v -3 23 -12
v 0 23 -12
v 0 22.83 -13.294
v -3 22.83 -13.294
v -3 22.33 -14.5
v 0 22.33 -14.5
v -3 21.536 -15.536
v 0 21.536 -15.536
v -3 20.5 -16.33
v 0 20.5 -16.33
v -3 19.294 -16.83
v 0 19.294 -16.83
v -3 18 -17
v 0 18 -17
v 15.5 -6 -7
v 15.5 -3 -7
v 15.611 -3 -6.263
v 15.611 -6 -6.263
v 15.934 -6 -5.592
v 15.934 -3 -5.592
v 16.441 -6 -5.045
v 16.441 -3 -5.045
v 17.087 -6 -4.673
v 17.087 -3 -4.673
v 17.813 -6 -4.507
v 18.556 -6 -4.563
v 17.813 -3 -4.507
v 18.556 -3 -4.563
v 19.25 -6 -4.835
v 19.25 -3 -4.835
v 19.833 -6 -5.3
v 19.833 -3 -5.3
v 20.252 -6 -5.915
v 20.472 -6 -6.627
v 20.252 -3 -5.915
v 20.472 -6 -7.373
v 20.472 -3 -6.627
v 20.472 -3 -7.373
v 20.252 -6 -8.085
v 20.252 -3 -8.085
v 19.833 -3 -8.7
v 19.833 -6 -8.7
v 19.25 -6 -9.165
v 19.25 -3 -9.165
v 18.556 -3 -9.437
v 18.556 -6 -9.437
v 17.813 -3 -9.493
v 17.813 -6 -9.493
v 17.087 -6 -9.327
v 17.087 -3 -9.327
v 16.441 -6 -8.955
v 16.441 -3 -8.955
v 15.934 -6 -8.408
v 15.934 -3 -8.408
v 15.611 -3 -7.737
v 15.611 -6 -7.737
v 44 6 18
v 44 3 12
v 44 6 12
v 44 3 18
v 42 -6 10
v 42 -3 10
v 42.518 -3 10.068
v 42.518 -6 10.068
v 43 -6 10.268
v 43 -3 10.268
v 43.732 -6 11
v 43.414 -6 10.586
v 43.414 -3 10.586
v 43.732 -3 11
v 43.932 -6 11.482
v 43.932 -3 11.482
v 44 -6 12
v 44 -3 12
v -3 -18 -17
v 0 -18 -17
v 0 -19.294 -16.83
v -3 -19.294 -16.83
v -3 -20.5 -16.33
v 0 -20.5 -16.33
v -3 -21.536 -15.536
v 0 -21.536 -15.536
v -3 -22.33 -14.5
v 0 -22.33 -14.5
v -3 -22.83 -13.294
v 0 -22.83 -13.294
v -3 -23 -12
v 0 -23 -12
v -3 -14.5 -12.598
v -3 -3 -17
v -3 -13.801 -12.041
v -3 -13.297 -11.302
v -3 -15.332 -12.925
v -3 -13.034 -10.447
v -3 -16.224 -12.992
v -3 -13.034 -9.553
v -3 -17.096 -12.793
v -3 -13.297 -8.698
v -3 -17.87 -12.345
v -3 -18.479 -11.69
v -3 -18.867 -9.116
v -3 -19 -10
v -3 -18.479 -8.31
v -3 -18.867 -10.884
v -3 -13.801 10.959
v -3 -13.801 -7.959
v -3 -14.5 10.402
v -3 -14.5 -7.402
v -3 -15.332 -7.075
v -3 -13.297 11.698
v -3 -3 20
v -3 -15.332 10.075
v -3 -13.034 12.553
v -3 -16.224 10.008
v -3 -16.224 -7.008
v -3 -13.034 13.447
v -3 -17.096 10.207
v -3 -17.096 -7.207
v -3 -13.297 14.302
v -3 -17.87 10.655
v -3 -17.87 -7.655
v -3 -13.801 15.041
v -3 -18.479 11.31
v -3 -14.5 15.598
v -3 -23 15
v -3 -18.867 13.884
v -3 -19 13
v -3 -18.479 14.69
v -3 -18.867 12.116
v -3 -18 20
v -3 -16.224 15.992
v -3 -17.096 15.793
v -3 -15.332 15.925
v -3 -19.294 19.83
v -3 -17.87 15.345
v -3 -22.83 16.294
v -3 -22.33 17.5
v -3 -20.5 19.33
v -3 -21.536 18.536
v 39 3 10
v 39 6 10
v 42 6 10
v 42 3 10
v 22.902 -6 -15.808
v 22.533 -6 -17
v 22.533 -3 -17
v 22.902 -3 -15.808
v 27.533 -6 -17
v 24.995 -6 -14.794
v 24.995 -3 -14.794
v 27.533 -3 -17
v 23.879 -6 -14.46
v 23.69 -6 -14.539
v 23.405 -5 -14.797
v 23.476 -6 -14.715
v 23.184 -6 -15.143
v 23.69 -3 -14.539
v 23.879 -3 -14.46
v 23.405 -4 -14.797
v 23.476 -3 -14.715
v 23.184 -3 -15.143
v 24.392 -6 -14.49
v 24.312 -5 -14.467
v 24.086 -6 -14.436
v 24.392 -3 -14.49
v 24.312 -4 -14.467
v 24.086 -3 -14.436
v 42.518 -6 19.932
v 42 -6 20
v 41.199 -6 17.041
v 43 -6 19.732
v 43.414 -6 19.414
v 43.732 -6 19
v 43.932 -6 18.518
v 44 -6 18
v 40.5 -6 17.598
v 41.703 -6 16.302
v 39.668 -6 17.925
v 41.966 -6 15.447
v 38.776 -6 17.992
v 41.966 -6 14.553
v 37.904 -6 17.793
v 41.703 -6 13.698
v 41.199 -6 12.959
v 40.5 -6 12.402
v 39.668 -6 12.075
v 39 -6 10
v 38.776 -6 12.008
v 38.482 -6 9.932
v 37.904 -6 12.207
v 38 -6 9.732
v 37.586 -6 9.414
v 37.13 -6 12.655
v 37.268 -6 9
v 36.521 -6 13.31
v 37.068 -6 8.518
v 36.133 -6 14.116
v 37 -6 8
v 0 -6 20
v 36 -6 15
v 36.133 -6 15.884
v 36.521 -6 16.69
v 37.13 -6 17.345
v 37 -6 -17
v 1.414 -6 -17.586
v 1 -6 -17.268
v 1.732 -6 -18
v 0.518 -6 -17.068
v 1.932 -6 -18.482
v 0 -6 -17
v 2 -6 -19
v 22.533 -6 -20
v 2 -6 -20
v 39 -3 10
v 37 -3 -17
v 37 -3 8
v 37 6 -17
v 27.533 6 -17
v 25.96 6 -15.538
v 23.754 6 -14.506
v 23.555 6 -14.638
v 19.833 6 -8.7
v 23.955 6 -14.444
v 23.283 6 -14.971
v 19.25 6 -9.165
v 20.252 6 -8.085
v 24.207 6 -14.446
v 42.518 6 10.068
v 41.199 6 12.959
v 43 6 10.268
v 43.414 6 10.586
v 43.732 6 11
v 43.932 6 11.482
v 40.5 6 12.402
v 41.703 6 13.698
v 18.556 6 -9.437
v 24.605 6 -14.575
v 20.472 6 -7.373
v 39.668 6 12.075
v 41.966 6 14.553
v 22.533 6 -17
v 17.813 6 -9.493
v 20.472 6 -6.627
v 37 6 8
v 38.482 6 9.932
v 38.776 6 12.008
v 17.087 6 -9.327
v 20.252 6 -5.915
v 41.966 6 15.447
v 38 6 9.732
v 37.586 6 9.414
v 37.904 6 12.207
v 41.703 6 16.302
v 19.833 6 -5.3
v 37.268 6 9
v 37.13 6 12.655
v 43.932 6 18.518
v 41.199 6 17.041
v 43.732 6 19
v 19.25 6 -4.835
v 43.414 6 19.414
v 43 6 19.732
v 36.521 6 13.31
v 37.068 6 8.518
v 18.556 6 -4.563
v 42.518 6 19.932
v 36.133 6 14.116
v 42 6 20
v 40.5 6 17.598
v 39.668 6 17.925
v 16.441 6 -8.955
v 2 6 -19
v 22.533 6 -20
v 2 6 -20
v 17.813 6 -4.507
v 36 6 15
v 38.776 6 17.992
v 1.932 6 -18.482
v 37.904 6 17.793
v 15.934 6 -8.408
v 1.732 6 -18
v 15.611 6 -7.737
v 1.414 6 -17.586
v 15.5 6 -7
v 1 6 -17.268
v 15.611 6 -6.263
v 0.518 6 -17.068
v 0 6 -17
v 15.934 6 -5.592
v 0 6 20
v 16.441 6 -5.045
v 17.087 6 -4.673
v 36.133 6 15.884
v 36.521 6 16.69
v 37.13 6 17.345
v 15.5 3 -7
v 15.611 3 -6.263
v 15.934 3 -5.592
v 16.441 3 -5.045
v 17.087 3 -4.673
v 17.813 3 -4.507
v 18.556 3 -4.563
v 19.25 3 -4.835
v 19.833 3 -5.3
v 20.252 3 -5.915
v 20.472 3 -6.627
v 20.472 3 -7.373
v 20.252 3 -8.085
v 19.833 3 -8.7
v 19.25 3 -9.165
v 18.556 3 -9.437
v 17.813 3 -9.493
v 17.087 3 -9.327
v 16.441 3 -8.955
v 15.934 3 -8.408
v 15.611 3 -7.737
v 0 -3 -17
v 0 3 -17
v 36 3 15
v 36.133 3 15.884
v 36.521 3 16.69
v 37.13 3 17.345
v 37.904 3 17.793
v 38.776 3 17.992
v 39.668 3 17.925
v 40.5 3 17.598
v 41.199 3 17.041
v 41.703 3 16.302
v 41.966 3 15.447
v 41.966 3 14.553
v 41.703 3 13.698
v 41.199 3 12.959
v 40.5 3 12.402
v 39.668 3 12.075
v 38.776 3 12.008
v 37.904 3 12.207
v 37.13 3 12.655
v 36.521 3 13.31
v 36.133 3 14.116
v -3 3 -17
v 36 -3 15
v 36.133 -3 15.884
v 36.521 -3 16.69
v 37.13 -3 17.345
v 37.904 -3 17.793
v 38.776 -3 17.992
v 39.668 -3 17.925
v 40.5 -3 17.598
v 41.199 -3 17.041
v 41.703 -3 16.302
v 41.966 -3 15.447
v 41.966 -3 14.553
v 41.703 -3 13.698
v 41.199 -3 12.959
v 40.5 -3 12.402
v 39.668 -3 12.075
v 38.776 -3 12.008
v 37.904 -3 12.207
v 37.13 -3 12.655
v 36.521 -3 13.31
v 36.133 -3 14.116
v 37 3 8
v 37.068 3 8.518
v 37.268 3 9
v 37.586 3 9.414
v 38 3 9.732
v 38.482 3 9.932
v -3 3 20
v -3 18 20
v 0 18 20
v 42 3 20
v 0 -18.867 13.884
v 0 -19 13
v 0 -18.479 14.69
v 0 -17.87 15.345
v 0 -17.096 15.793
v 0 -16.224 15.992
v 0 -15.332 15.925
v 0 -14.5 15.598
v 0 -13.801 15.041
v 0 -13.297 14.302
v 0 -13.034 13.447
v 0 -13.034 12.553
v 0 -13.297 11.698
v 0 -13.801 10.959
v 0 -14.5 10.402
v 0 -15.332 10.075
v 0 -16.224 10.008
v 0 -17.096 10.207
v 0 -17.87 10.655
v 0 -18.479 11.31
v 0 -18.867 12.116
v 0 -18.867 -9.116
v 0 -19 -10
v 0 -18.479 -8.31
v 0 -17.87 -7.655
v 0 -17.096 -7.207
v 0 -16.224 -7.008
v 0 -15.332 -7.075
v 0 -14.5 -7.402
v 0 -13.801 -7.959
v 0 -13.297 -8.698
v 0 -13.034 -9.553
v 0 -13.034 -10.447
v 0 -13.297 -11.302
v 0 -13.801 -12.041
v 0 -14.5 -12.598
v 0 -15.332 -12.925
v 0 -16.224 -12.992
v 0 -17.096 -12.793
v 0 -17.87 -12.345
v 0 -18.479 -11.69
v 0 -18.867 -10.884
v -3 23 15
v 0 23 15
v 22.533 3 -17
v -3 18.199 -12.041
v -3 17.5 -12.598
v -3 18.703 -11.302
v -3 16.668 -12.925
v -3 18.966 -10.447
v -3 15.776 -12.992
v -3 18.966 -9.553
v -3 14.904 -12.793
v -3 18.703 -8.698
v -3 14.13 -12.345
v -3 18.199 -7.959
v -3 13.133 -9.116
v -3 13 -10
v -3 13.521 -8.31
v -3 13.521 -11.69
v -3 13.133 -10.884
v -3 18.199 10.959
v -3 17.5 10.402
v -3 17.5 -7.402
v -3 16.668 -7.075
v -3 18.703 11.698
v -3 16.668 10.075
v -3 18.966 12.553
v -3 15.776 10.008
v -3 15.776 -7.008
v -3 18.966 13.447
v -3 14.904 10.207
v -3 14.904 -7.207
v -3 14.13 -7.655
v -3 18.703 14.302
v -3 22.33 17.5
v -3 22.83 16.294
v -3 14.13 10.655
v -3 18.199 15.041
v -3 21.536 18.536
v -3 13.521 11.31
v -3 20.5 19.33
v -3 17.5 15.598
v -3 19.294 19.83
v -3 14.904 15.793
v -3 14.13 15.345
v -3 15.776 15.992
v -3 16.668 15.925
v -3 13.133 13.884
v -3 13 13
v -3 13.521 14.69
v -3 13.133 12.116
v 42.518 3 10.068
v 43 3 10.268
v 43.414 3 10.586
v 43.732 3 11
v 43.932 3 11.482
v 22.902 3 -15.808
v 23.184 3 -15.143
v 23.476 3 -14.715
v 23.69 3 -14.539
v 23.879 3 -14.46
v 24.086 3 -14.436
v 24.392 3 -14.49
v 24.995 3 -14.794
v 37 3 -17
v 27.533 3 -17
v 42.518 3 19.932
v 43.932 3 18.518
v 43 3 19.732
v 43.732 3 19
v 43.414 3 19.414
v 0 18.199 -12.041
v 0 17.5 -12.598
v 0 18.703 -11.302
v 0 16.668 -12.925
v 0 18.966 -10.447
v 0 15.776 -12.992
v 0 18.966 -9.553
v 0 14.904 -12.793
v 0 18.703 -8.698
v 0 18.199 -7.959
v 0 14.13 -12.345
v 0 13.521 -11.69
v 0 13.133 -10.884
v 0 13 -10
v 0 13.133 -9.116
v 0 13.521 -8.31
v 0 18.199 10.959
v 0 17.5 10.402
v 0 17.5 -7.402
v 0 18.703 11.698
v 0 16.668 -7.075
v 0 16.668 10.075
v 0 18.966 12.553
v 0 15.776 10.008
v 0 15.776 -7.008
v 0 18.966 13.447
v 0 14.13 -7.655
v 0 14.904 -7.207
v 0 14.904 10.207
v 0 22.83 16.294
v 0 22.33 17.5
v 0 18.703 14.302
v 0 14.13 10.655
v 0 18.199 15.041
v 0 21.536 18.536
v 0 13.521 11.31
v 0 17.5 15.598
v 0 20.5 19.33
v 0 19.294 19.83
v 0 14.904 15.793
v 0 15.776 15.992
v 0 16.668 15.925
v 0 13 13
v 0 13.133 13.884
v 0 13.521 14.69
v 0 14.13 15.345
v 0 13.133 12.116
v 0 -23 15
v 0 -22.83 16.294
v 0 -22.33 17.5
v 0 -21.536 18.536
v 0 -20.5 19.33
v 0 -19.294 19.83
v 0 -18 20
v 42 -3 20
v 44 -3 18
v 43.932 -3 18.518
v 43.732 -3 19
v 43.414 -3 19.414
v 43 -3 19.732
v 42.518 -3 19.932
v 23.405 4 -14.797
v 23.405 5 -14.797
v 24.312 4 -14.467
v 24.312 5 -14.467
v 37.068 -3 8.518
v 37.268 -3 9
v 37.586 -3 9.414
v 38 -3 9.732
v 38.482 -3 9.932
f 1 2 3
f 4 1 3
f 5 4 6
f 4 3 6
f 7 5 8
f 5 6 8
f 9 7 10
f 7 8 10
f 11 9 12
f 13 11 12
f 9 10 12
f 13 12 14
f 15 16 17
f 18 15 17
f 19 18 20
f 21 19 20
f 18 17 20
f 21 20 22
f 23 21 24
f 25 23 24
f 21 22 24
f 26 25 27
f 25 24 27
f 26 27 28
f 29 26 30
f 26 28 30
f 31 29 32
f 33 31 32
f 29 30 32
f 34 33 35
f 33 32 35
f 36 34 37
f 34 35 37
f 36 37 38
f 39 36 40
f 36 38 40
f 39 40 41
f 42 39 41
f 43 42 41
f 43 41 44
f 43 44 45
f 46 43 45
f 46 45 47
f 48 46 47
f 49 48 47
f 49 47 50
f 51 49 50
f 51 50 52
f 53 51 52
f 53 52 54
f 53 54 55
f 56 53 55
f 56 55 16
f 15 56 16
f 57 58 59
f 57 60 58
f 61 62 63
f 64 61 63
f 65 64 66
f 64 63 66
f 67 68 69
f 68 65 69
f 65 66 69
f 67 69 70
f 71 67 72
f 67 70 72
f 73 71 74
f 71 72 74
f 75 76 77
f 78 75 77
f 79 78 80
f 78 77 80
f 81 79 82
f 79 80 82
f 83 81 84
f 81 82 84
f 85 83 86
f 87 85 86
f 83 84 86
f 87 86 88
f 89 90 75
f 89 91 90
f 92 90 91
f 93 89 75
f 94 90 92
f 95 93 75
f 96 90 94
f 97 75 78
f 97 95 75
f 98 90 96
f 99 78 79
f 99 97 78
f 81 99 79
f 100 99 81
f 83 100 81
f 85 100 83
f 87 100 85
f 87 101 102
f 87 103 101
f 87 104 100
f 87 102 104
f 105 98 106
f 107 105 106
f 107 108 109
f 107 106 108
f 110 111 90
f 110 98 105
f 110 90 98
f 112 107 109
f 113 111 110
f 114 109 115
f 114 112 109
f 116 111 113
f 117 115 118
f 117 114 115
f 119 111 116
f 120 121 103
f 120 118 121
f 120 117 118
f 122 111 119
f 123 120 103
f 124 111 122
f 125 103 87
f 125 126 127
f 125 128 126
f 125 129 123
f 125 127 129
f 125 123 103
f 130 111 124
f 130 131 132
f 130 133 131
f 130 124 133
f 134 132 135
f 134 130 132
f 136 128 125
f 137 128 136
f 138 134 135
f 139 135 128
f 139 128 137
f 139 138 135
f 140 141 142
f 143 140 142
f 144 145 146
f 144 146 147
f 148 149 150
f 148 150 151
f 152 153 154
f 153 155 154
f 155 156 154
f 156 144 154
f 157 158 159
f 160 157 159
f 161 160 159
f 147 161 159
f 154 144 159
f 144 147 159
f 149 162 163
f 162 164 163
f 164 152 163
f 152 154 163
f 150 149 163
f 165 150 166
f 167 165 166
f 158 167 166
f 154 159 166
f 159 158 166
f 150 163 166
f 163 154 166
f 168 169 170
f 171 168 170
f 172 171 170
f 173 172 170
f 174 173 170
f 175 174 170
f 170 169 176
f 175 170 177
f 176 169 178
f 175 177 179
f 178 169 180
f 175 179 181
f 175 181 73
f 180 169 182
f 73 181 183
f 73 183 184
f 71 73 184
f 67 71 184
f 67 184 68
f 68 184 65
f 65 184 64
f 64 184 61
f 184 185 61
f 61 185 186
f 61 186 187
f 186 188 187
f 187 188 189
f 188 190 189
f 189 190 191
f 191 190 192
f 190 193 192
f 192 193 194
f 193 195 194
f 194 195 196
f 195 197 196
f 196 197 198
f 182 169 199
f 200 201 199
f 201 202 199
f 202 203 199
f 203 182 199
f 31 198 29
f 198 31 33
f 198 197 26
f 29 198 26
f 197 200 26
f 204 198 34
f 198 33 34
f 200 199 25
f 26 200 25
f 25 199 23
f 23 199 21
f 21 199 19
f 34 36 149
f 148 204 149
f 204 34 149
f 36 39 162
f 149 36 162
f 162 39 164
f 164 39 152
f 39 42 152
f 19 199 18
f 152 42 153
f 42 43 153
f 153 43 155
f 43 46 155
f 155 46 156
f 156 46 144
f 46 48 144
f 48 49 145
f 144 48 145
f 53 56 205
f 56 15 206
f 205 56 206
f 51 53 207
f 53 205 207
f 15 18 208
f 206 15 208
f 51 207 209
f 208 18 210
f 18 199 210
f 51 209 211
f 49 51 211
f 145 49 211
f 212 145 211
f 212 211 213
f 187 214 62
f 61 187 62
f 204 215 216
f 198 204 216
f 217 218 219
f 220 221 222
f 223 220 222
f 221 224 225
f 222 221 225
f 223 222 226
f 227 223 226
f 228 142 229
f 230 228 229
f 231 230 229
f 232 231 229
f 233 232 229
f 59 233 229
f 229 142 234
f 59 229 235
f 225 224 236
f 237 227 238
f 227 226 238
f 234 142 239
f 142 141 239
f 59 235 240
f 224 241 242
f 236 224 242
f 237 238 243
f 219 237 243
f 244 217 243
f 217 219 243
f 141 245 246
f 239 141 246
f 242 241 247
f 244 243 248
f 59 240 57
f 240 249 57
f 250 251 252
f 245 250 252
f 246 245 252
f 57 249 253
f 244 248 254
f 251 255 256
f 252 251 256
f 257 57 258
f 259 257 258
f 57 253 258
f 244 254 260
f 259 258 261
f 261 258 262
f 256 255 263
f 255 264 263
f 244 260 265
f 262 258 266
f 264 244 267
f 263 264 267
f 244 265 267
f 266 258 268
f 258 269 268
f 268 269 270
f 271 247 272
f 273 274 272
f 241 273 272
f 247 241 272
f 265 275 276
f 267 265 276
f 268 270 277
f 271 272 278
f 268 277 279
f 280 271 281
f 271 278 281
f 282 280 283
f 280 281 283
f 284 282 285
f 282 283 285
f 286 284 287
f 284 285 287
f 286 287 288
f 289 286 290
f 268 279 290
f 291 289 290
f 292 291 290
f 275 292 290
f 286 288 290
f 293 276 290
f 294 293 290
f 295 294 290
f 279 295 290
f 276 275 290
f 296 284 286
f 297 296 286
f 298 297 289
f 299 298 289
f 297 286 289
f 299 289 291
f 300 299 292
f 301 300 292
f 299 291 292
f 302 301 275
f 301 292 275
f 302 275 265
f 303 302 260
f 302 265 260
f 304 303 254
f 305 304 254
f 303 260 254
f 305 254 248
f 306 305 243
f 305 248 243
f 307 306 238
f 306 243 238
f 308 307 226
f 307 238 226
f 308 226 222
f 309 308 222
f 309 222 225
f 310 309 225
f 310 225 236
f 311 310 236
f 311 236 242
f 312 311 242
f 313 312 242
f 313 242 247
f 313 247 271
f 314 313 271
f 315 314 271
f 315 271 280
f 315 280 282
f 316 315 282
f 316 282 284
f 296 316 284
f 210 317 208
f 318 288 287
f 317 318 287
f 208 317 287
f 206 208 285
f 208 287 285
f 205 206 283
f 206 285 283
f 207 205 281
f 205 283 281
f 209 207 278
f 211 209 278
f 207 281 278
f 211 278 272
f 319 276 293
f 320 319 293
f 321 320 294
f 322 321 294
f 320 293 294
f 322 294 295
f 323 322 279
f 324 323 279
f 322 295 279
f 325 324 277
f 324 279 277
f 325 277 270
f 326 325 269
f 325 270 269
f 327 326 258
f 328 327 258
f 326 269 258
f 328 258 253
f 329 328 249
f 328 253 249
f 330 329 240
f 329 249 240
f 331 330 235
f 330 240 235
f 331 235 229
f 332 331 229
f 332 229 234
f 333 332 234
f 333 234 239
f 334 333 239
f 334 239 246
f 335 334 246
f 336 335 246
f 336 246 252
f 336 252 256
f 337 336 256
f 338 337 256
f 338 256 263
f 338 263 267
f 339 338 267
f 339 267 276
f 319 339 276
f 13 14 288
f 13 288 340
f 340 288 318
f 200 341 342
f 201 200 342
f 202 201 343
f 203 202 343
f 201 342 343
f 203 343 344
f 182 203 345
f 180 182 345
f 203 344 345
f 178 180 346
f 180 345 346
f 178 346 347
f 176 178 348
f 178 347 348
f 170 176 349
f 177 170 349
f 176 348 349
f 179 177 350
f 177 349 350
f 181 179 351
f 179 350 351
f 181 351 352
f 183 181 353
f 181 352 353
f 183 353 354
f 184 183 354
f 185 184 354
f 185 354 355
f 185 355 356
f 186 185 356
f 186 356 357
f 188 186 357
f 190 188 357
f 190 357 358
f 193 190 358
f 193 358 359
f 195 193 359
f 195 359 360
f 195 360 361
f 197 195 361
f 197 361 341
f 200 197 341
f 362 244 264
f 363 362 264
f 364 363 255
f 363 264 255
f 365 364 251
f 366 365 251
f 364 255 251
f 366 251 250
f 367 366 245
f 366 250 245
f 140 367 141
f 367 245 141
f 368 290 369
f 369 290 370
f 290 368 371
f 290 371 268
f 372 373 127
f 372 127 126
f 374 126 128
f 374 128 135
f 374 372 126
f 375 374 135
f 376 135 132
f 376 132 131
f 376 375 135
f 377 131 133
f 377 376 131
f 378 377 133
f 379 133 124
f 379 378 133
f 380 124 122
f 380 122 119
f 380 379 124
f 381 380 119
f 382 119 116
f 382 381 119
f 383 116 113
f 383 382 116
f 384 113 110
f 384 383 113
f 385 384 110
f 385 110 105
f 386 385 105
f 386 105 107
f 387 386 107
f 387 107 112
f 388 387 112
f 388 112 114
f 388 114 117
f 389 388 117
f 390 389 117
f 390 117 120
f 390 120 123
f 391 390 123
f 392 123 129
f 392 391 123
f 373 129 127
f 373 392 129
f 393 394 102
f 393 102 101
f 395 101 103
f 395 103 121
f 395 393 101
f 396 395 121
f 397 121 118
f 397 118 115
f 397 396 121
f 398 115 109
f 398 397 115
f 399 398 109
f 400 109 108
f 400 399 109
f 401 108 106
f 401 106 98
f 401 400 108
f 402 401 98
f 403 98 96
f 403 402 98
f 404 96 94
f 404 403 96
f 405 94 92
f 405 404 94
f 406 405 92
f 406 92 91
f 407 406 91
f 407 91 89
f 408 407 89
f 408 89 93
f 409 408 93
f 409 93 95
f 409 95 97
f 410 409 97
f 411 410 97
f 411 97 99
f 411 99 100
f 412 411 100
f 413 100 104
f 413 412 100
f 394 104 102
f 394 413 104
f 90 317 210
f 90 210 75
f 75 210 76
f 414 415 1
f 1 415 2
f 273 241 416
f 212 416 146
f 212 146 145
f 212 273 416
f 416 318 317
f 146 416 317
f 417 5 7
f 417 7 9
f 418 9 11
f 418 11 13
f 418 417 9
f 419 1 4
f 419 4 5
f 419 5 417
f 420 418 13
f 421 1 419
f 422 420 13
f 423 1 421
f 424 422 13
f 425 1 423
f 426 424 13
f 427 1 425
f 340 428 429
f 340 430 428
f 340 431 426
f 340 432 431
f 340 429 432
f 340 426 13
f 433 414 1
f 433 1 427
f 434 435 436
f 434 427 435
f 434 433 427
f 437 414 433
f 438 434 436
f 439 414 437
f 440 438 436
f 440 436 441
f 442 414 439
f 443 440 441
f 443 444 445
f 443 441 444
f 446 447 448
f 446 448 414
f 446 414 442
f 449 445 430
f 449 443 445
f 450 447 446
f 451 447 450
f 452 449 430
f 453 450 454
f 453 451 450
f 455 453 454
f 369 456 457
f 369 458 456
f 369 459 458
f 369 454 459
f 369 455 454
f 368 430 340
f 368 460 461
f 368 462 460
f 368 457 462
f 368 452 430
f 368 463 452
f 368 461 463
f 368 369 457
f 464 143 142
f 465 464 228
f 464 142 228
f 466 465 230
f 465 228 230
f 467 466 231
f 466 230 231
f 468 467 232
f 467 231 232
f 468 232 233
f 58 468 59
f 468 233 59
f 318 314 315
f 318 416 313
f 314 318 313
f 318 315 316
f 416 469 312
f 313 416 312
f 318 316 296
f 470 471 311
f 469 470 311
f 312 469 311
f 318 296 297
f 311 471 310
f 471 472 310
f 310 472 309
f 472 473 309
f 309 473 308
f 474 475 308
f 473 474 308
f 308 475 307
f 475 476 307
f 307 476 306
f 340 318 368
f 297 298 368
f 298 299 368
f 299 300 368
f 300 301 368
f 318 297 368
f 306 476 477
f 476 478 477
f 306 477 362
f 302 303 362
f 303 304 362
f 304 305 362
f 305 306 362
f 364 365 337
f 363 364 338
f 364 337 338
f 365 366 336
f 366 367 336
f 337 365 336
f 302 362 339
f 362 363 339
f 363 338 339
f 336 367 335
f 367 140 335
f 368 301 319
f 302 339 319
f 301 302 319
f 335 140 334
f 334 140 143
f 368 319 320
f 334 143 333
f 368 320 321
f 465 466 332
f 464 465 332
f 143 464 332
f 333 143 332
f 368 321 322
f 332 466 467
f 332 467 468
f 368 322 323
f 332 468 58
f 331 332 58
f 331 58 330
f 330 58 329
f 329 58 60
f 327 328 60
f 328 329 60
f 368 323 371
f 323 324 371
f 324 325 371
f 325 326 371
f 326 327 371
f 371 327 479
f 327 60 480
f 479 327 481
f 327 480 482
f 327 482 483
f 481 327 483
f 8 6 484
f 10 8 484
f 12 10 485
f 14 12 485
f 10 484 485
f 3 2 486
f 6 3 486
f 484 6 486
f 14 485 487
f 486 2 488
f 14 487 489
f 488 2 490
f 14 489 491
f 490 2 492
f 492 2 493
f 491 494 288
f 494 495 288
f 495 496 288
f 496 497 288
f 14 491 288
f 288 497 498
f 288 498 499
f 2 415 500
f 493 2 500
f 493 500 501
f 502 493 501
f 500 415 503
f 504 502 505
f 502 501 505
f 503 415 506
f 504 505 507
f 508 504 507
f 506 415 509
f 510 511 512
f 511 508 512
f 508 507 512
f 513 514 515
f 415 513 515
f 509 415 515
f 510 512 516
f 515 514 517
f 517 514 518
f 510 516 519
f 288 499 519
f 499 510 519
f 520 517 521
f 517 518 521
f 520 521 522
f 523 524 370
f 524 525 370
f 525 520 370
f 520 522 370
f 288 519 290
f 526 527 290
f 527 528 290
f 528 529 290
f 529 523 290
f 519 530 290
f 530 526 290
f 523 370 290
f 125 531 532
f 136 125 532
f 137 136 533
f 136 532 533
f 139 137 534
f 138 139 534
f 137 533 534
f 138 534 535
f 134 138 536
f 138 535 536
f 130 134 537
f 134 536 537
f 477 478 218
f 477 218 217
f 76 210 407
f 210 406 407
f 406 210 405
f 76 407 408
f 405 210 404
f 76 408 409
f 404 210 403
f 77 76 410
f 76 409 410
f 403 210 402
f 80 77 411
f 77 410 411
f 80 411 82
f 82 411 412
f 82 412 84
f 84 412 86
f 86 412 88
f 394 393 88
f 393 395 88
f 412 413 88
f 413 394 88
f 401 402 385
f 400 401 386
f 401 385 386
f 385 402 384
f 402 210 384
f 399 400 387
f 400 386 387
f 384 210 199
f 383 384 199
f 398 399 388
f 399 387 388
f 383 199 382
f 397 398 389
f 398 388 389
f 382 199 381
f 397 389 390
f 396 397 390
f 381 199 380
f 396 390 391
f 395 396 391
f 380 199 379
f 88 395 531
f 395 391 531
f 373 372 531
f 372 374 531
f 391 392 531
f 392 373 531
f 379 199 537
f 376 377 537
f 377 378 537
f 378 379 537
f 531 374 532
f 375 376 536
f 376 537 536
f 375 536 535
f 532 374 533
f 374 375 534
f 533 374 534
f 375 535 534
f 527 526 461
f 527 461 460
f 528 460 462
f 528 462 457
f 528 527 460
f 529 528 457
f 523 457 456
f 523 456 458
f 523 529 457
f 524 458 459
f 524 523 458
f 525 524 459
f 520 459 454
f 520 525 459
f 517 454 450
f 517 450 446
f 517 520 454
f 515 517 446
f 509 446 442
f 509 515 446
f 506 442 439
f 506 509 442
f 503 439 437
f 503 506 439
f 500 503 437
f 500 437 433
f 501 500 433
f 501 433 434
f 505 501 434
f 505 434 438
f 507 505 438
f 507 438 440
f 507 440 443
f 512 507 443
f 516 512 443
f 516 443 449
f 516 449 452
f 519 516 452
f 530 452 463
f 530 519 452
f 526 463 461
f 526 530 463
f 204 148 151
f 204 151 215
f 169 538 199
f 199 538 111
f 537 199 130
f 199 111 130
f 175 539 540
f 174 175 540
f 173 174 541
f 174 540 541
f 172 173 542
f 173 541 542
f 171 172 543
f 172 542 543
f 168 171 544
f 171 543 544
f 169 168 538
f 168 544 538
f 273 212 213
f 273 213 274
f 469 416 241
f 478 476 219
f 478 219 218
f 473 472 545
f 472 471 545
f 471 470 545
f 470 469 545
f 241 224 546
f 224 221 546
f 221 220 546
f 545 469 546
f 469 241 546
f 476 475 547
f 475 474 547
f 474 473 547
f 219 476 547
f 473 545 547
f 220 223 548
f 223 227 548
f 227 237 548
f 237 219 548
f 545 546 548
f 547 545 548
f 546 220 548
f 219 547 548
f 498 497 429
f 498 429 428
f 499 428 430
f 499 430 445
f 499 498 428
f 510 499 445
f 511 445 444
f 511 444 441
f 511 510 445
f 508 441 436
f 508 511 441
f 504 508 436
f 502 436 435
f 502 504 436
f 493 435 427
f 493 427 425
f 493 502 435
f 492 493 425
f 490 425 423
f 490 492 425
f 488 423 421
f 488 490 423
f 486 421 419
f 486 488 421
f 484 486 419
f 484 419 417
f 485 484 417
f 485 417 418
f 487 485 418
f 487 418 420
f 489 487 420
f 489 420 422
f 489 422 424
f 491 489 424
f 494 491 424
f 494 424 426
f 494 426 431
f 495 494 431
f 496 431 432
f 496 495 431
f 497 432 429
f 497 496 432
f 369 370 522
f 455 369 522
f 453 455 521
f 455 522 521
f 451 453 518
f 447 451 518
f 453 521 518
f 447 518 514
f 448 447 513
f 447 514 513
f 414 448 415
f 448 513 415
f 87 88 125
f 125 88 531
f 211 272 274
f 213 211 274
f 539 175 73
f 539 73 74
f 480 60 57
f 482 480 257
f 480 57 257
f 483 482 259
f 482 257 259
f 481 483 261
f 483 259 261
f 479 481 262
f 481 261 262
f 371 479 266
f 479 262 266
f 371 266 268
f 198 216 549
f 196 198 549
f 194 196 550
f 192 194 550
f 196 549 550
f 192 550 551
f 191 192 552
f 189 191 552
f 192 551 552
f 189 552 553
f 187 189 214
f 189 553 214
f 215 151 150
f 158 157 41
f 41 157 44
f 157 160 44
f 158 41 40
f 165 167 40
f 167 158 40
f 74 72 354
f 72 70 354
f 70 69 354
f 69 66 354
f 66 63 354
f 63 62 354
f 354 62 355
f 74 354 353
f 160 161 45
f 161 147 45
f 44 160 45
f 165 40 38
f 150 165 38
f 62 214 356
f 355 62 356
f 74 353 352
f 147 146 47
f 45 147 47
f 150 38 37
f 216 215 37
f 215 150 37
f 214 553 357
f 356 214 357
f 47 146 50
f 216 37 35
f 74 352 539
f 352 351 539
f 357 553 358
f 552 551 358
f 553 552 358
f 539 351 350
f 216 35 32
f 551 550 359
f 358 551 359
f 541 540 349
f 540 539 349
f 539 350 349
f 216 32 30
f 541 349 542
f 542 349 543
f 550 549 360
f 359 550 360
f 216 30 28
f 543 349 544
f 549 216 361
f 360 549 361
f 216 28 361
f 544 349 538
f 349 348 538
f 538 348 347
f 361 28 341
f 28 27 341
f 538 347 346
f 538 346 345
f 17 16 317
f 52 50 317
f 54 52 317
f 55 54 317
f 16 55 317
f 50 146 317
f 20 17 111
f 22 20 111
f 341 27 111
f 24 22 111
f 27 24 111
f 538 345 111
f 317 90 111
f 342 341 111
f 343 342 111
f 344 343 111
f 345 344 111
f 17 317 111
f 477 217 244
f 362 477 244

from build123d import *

# Parameters (mm, degrees)
F1_DEPTH = 44
F2_R     = 3
F3_DEPTH = 3
F4_W     = 21.4669842049
F4_H     = 12
F5_DEPTH = 3
F6_R     = 3
F6_R_2   = 2.5
F7_DEPTH = 25


with BuildPart() as f1:
    # F0 (on Right) → F1 (new body)
    with BuildSketch(Plane.YZ):
        Polygon((6, -20), (6, 20), (3, 20), (3, -17), (-3, -17), (-3, 20), (-6, 20), (-6, -20), align=None)
    extrude(amount=F1_DEPTH)

    # F2 (on face) → F3 (join)
    with BuildSketch(Plane(origin=(0, 0, 0), x_dir=(0, -1, 0), z_dir=(-1, 0, 0))):
        with BuildLine():
            Line((-3, -17), (-3, 20))
            Line((-3, 20), (-18, 20))
            ThreePointArc((-18, 20), (-21.5355339059, 18.5355339059), (-23, 15))
            Line((-23, 15), (-23, -12))
            ThreePointArc((-23, -12), (-21.5355339059, -15.5355339059), (-18, -17))
            Line((-18, -17), (-3, -17))
        make_face()
        with Locations((-16, -10)):
            Circle(F2_R, mode=Mode.SUBTRACT)
        with Locations((-16, 13)):
            Circle(F2_R, mode=Mode.SUBTRACT)
        with BuildLine():
            Line((18, 20), (3, 20))
            Line((3, 20), (3, -17))
            Line((3, -17), (18, -17))
            ThreePointArc((18, -17), (21.5355339059, -15.5355339059), (23, -12))
            Line((23, -12), (23, 15))
            ThreePointArc((23, 15), (21.5355339059, 18.5355339059), (18, 20))
        make_face()
        with Locations((16, -10)):
            Circle(F2_R, mode=Mode.SUBTRACT)
        with Locations((16, 13)):
            Circle(F2_R, mode=Mode.SUBTRACT)
    extrude(amount=F3_DEPTH)

    # F4 (on face) → F5 (cut)
    with BuildSketch(Plane(origin=(0, 0, -20), x_dir=(1, 0, 0), z_dir=(0, 0, -1))):
        with Locations((33.2665078975, 0)):
            Rectangle(F4_W, F4_H)
    extrude(amount=-F5_DEPTH, mode=Mode.SUBTRACT)

    # F6 (on face) → F7 (cut)
    with BuildSketch(Plane(origin=(0, 6, 0), x_dir=(-1, 0, 0), z_dir=(0, 1, 0))):
        with BuildLine():
            Line((-44, -17), (-37, -17))
            Line((-37, -17), (-37, 8))
            ThreePointArc((-37, 8), (-37.5857864376, 9.4142135624), (-39, 10))
            Line((-39, 10), (-42, 10))
            ThreePointArc((-42, 10), (-43.4142135624, 10.5857864376), (-44, 12))
            Line((-44, 12), (-44, -17))
        make_face()
        with Locations((-39, 15)):
            Circle(F6_R)
        with BuildLine():
            Line((-44, 20), (-44, 18))
            ThreePointArc((-44, 18), (-43.4142135624, 19.4142135624), (-42, 20))
            Line((-42, 20), (-44, 20))
        make_face()
        with BuildLine():
            Line((-2, -19), (-2, -20))
            Line((-2, -20), (0, -20))
            Line((0, -20), (0, -17))
            ThreePointArc((0, -17), (-1.4142135624, -17.5857864376), (-2, -19))
        make_face()
        with BuildLine():
            add(Edge.make_bspline(
                [(-22.5330157951, -17), (-22.7836436775, -16.1303906467), (-23.1942051069, -14.7058546262), (-24.5152526704, -14.1009978001), (-26.3186845718, -15.8337712078), (-27.5330157951, -17)],
                knots=[0, 0, 0, 0, 0.3386124105, 0.5546847127, 1, 1, 1, 1], degree=3))
            Line((-27.5330157951, -17), (-22.5330157951, -17))
        make_face()
        with Locations((-18, -7)):
            Circle(F6_R_2)
    extrude(amount=-F7_DEPTH, mode=Mode.SUBTRACT)


solid = f1.part
